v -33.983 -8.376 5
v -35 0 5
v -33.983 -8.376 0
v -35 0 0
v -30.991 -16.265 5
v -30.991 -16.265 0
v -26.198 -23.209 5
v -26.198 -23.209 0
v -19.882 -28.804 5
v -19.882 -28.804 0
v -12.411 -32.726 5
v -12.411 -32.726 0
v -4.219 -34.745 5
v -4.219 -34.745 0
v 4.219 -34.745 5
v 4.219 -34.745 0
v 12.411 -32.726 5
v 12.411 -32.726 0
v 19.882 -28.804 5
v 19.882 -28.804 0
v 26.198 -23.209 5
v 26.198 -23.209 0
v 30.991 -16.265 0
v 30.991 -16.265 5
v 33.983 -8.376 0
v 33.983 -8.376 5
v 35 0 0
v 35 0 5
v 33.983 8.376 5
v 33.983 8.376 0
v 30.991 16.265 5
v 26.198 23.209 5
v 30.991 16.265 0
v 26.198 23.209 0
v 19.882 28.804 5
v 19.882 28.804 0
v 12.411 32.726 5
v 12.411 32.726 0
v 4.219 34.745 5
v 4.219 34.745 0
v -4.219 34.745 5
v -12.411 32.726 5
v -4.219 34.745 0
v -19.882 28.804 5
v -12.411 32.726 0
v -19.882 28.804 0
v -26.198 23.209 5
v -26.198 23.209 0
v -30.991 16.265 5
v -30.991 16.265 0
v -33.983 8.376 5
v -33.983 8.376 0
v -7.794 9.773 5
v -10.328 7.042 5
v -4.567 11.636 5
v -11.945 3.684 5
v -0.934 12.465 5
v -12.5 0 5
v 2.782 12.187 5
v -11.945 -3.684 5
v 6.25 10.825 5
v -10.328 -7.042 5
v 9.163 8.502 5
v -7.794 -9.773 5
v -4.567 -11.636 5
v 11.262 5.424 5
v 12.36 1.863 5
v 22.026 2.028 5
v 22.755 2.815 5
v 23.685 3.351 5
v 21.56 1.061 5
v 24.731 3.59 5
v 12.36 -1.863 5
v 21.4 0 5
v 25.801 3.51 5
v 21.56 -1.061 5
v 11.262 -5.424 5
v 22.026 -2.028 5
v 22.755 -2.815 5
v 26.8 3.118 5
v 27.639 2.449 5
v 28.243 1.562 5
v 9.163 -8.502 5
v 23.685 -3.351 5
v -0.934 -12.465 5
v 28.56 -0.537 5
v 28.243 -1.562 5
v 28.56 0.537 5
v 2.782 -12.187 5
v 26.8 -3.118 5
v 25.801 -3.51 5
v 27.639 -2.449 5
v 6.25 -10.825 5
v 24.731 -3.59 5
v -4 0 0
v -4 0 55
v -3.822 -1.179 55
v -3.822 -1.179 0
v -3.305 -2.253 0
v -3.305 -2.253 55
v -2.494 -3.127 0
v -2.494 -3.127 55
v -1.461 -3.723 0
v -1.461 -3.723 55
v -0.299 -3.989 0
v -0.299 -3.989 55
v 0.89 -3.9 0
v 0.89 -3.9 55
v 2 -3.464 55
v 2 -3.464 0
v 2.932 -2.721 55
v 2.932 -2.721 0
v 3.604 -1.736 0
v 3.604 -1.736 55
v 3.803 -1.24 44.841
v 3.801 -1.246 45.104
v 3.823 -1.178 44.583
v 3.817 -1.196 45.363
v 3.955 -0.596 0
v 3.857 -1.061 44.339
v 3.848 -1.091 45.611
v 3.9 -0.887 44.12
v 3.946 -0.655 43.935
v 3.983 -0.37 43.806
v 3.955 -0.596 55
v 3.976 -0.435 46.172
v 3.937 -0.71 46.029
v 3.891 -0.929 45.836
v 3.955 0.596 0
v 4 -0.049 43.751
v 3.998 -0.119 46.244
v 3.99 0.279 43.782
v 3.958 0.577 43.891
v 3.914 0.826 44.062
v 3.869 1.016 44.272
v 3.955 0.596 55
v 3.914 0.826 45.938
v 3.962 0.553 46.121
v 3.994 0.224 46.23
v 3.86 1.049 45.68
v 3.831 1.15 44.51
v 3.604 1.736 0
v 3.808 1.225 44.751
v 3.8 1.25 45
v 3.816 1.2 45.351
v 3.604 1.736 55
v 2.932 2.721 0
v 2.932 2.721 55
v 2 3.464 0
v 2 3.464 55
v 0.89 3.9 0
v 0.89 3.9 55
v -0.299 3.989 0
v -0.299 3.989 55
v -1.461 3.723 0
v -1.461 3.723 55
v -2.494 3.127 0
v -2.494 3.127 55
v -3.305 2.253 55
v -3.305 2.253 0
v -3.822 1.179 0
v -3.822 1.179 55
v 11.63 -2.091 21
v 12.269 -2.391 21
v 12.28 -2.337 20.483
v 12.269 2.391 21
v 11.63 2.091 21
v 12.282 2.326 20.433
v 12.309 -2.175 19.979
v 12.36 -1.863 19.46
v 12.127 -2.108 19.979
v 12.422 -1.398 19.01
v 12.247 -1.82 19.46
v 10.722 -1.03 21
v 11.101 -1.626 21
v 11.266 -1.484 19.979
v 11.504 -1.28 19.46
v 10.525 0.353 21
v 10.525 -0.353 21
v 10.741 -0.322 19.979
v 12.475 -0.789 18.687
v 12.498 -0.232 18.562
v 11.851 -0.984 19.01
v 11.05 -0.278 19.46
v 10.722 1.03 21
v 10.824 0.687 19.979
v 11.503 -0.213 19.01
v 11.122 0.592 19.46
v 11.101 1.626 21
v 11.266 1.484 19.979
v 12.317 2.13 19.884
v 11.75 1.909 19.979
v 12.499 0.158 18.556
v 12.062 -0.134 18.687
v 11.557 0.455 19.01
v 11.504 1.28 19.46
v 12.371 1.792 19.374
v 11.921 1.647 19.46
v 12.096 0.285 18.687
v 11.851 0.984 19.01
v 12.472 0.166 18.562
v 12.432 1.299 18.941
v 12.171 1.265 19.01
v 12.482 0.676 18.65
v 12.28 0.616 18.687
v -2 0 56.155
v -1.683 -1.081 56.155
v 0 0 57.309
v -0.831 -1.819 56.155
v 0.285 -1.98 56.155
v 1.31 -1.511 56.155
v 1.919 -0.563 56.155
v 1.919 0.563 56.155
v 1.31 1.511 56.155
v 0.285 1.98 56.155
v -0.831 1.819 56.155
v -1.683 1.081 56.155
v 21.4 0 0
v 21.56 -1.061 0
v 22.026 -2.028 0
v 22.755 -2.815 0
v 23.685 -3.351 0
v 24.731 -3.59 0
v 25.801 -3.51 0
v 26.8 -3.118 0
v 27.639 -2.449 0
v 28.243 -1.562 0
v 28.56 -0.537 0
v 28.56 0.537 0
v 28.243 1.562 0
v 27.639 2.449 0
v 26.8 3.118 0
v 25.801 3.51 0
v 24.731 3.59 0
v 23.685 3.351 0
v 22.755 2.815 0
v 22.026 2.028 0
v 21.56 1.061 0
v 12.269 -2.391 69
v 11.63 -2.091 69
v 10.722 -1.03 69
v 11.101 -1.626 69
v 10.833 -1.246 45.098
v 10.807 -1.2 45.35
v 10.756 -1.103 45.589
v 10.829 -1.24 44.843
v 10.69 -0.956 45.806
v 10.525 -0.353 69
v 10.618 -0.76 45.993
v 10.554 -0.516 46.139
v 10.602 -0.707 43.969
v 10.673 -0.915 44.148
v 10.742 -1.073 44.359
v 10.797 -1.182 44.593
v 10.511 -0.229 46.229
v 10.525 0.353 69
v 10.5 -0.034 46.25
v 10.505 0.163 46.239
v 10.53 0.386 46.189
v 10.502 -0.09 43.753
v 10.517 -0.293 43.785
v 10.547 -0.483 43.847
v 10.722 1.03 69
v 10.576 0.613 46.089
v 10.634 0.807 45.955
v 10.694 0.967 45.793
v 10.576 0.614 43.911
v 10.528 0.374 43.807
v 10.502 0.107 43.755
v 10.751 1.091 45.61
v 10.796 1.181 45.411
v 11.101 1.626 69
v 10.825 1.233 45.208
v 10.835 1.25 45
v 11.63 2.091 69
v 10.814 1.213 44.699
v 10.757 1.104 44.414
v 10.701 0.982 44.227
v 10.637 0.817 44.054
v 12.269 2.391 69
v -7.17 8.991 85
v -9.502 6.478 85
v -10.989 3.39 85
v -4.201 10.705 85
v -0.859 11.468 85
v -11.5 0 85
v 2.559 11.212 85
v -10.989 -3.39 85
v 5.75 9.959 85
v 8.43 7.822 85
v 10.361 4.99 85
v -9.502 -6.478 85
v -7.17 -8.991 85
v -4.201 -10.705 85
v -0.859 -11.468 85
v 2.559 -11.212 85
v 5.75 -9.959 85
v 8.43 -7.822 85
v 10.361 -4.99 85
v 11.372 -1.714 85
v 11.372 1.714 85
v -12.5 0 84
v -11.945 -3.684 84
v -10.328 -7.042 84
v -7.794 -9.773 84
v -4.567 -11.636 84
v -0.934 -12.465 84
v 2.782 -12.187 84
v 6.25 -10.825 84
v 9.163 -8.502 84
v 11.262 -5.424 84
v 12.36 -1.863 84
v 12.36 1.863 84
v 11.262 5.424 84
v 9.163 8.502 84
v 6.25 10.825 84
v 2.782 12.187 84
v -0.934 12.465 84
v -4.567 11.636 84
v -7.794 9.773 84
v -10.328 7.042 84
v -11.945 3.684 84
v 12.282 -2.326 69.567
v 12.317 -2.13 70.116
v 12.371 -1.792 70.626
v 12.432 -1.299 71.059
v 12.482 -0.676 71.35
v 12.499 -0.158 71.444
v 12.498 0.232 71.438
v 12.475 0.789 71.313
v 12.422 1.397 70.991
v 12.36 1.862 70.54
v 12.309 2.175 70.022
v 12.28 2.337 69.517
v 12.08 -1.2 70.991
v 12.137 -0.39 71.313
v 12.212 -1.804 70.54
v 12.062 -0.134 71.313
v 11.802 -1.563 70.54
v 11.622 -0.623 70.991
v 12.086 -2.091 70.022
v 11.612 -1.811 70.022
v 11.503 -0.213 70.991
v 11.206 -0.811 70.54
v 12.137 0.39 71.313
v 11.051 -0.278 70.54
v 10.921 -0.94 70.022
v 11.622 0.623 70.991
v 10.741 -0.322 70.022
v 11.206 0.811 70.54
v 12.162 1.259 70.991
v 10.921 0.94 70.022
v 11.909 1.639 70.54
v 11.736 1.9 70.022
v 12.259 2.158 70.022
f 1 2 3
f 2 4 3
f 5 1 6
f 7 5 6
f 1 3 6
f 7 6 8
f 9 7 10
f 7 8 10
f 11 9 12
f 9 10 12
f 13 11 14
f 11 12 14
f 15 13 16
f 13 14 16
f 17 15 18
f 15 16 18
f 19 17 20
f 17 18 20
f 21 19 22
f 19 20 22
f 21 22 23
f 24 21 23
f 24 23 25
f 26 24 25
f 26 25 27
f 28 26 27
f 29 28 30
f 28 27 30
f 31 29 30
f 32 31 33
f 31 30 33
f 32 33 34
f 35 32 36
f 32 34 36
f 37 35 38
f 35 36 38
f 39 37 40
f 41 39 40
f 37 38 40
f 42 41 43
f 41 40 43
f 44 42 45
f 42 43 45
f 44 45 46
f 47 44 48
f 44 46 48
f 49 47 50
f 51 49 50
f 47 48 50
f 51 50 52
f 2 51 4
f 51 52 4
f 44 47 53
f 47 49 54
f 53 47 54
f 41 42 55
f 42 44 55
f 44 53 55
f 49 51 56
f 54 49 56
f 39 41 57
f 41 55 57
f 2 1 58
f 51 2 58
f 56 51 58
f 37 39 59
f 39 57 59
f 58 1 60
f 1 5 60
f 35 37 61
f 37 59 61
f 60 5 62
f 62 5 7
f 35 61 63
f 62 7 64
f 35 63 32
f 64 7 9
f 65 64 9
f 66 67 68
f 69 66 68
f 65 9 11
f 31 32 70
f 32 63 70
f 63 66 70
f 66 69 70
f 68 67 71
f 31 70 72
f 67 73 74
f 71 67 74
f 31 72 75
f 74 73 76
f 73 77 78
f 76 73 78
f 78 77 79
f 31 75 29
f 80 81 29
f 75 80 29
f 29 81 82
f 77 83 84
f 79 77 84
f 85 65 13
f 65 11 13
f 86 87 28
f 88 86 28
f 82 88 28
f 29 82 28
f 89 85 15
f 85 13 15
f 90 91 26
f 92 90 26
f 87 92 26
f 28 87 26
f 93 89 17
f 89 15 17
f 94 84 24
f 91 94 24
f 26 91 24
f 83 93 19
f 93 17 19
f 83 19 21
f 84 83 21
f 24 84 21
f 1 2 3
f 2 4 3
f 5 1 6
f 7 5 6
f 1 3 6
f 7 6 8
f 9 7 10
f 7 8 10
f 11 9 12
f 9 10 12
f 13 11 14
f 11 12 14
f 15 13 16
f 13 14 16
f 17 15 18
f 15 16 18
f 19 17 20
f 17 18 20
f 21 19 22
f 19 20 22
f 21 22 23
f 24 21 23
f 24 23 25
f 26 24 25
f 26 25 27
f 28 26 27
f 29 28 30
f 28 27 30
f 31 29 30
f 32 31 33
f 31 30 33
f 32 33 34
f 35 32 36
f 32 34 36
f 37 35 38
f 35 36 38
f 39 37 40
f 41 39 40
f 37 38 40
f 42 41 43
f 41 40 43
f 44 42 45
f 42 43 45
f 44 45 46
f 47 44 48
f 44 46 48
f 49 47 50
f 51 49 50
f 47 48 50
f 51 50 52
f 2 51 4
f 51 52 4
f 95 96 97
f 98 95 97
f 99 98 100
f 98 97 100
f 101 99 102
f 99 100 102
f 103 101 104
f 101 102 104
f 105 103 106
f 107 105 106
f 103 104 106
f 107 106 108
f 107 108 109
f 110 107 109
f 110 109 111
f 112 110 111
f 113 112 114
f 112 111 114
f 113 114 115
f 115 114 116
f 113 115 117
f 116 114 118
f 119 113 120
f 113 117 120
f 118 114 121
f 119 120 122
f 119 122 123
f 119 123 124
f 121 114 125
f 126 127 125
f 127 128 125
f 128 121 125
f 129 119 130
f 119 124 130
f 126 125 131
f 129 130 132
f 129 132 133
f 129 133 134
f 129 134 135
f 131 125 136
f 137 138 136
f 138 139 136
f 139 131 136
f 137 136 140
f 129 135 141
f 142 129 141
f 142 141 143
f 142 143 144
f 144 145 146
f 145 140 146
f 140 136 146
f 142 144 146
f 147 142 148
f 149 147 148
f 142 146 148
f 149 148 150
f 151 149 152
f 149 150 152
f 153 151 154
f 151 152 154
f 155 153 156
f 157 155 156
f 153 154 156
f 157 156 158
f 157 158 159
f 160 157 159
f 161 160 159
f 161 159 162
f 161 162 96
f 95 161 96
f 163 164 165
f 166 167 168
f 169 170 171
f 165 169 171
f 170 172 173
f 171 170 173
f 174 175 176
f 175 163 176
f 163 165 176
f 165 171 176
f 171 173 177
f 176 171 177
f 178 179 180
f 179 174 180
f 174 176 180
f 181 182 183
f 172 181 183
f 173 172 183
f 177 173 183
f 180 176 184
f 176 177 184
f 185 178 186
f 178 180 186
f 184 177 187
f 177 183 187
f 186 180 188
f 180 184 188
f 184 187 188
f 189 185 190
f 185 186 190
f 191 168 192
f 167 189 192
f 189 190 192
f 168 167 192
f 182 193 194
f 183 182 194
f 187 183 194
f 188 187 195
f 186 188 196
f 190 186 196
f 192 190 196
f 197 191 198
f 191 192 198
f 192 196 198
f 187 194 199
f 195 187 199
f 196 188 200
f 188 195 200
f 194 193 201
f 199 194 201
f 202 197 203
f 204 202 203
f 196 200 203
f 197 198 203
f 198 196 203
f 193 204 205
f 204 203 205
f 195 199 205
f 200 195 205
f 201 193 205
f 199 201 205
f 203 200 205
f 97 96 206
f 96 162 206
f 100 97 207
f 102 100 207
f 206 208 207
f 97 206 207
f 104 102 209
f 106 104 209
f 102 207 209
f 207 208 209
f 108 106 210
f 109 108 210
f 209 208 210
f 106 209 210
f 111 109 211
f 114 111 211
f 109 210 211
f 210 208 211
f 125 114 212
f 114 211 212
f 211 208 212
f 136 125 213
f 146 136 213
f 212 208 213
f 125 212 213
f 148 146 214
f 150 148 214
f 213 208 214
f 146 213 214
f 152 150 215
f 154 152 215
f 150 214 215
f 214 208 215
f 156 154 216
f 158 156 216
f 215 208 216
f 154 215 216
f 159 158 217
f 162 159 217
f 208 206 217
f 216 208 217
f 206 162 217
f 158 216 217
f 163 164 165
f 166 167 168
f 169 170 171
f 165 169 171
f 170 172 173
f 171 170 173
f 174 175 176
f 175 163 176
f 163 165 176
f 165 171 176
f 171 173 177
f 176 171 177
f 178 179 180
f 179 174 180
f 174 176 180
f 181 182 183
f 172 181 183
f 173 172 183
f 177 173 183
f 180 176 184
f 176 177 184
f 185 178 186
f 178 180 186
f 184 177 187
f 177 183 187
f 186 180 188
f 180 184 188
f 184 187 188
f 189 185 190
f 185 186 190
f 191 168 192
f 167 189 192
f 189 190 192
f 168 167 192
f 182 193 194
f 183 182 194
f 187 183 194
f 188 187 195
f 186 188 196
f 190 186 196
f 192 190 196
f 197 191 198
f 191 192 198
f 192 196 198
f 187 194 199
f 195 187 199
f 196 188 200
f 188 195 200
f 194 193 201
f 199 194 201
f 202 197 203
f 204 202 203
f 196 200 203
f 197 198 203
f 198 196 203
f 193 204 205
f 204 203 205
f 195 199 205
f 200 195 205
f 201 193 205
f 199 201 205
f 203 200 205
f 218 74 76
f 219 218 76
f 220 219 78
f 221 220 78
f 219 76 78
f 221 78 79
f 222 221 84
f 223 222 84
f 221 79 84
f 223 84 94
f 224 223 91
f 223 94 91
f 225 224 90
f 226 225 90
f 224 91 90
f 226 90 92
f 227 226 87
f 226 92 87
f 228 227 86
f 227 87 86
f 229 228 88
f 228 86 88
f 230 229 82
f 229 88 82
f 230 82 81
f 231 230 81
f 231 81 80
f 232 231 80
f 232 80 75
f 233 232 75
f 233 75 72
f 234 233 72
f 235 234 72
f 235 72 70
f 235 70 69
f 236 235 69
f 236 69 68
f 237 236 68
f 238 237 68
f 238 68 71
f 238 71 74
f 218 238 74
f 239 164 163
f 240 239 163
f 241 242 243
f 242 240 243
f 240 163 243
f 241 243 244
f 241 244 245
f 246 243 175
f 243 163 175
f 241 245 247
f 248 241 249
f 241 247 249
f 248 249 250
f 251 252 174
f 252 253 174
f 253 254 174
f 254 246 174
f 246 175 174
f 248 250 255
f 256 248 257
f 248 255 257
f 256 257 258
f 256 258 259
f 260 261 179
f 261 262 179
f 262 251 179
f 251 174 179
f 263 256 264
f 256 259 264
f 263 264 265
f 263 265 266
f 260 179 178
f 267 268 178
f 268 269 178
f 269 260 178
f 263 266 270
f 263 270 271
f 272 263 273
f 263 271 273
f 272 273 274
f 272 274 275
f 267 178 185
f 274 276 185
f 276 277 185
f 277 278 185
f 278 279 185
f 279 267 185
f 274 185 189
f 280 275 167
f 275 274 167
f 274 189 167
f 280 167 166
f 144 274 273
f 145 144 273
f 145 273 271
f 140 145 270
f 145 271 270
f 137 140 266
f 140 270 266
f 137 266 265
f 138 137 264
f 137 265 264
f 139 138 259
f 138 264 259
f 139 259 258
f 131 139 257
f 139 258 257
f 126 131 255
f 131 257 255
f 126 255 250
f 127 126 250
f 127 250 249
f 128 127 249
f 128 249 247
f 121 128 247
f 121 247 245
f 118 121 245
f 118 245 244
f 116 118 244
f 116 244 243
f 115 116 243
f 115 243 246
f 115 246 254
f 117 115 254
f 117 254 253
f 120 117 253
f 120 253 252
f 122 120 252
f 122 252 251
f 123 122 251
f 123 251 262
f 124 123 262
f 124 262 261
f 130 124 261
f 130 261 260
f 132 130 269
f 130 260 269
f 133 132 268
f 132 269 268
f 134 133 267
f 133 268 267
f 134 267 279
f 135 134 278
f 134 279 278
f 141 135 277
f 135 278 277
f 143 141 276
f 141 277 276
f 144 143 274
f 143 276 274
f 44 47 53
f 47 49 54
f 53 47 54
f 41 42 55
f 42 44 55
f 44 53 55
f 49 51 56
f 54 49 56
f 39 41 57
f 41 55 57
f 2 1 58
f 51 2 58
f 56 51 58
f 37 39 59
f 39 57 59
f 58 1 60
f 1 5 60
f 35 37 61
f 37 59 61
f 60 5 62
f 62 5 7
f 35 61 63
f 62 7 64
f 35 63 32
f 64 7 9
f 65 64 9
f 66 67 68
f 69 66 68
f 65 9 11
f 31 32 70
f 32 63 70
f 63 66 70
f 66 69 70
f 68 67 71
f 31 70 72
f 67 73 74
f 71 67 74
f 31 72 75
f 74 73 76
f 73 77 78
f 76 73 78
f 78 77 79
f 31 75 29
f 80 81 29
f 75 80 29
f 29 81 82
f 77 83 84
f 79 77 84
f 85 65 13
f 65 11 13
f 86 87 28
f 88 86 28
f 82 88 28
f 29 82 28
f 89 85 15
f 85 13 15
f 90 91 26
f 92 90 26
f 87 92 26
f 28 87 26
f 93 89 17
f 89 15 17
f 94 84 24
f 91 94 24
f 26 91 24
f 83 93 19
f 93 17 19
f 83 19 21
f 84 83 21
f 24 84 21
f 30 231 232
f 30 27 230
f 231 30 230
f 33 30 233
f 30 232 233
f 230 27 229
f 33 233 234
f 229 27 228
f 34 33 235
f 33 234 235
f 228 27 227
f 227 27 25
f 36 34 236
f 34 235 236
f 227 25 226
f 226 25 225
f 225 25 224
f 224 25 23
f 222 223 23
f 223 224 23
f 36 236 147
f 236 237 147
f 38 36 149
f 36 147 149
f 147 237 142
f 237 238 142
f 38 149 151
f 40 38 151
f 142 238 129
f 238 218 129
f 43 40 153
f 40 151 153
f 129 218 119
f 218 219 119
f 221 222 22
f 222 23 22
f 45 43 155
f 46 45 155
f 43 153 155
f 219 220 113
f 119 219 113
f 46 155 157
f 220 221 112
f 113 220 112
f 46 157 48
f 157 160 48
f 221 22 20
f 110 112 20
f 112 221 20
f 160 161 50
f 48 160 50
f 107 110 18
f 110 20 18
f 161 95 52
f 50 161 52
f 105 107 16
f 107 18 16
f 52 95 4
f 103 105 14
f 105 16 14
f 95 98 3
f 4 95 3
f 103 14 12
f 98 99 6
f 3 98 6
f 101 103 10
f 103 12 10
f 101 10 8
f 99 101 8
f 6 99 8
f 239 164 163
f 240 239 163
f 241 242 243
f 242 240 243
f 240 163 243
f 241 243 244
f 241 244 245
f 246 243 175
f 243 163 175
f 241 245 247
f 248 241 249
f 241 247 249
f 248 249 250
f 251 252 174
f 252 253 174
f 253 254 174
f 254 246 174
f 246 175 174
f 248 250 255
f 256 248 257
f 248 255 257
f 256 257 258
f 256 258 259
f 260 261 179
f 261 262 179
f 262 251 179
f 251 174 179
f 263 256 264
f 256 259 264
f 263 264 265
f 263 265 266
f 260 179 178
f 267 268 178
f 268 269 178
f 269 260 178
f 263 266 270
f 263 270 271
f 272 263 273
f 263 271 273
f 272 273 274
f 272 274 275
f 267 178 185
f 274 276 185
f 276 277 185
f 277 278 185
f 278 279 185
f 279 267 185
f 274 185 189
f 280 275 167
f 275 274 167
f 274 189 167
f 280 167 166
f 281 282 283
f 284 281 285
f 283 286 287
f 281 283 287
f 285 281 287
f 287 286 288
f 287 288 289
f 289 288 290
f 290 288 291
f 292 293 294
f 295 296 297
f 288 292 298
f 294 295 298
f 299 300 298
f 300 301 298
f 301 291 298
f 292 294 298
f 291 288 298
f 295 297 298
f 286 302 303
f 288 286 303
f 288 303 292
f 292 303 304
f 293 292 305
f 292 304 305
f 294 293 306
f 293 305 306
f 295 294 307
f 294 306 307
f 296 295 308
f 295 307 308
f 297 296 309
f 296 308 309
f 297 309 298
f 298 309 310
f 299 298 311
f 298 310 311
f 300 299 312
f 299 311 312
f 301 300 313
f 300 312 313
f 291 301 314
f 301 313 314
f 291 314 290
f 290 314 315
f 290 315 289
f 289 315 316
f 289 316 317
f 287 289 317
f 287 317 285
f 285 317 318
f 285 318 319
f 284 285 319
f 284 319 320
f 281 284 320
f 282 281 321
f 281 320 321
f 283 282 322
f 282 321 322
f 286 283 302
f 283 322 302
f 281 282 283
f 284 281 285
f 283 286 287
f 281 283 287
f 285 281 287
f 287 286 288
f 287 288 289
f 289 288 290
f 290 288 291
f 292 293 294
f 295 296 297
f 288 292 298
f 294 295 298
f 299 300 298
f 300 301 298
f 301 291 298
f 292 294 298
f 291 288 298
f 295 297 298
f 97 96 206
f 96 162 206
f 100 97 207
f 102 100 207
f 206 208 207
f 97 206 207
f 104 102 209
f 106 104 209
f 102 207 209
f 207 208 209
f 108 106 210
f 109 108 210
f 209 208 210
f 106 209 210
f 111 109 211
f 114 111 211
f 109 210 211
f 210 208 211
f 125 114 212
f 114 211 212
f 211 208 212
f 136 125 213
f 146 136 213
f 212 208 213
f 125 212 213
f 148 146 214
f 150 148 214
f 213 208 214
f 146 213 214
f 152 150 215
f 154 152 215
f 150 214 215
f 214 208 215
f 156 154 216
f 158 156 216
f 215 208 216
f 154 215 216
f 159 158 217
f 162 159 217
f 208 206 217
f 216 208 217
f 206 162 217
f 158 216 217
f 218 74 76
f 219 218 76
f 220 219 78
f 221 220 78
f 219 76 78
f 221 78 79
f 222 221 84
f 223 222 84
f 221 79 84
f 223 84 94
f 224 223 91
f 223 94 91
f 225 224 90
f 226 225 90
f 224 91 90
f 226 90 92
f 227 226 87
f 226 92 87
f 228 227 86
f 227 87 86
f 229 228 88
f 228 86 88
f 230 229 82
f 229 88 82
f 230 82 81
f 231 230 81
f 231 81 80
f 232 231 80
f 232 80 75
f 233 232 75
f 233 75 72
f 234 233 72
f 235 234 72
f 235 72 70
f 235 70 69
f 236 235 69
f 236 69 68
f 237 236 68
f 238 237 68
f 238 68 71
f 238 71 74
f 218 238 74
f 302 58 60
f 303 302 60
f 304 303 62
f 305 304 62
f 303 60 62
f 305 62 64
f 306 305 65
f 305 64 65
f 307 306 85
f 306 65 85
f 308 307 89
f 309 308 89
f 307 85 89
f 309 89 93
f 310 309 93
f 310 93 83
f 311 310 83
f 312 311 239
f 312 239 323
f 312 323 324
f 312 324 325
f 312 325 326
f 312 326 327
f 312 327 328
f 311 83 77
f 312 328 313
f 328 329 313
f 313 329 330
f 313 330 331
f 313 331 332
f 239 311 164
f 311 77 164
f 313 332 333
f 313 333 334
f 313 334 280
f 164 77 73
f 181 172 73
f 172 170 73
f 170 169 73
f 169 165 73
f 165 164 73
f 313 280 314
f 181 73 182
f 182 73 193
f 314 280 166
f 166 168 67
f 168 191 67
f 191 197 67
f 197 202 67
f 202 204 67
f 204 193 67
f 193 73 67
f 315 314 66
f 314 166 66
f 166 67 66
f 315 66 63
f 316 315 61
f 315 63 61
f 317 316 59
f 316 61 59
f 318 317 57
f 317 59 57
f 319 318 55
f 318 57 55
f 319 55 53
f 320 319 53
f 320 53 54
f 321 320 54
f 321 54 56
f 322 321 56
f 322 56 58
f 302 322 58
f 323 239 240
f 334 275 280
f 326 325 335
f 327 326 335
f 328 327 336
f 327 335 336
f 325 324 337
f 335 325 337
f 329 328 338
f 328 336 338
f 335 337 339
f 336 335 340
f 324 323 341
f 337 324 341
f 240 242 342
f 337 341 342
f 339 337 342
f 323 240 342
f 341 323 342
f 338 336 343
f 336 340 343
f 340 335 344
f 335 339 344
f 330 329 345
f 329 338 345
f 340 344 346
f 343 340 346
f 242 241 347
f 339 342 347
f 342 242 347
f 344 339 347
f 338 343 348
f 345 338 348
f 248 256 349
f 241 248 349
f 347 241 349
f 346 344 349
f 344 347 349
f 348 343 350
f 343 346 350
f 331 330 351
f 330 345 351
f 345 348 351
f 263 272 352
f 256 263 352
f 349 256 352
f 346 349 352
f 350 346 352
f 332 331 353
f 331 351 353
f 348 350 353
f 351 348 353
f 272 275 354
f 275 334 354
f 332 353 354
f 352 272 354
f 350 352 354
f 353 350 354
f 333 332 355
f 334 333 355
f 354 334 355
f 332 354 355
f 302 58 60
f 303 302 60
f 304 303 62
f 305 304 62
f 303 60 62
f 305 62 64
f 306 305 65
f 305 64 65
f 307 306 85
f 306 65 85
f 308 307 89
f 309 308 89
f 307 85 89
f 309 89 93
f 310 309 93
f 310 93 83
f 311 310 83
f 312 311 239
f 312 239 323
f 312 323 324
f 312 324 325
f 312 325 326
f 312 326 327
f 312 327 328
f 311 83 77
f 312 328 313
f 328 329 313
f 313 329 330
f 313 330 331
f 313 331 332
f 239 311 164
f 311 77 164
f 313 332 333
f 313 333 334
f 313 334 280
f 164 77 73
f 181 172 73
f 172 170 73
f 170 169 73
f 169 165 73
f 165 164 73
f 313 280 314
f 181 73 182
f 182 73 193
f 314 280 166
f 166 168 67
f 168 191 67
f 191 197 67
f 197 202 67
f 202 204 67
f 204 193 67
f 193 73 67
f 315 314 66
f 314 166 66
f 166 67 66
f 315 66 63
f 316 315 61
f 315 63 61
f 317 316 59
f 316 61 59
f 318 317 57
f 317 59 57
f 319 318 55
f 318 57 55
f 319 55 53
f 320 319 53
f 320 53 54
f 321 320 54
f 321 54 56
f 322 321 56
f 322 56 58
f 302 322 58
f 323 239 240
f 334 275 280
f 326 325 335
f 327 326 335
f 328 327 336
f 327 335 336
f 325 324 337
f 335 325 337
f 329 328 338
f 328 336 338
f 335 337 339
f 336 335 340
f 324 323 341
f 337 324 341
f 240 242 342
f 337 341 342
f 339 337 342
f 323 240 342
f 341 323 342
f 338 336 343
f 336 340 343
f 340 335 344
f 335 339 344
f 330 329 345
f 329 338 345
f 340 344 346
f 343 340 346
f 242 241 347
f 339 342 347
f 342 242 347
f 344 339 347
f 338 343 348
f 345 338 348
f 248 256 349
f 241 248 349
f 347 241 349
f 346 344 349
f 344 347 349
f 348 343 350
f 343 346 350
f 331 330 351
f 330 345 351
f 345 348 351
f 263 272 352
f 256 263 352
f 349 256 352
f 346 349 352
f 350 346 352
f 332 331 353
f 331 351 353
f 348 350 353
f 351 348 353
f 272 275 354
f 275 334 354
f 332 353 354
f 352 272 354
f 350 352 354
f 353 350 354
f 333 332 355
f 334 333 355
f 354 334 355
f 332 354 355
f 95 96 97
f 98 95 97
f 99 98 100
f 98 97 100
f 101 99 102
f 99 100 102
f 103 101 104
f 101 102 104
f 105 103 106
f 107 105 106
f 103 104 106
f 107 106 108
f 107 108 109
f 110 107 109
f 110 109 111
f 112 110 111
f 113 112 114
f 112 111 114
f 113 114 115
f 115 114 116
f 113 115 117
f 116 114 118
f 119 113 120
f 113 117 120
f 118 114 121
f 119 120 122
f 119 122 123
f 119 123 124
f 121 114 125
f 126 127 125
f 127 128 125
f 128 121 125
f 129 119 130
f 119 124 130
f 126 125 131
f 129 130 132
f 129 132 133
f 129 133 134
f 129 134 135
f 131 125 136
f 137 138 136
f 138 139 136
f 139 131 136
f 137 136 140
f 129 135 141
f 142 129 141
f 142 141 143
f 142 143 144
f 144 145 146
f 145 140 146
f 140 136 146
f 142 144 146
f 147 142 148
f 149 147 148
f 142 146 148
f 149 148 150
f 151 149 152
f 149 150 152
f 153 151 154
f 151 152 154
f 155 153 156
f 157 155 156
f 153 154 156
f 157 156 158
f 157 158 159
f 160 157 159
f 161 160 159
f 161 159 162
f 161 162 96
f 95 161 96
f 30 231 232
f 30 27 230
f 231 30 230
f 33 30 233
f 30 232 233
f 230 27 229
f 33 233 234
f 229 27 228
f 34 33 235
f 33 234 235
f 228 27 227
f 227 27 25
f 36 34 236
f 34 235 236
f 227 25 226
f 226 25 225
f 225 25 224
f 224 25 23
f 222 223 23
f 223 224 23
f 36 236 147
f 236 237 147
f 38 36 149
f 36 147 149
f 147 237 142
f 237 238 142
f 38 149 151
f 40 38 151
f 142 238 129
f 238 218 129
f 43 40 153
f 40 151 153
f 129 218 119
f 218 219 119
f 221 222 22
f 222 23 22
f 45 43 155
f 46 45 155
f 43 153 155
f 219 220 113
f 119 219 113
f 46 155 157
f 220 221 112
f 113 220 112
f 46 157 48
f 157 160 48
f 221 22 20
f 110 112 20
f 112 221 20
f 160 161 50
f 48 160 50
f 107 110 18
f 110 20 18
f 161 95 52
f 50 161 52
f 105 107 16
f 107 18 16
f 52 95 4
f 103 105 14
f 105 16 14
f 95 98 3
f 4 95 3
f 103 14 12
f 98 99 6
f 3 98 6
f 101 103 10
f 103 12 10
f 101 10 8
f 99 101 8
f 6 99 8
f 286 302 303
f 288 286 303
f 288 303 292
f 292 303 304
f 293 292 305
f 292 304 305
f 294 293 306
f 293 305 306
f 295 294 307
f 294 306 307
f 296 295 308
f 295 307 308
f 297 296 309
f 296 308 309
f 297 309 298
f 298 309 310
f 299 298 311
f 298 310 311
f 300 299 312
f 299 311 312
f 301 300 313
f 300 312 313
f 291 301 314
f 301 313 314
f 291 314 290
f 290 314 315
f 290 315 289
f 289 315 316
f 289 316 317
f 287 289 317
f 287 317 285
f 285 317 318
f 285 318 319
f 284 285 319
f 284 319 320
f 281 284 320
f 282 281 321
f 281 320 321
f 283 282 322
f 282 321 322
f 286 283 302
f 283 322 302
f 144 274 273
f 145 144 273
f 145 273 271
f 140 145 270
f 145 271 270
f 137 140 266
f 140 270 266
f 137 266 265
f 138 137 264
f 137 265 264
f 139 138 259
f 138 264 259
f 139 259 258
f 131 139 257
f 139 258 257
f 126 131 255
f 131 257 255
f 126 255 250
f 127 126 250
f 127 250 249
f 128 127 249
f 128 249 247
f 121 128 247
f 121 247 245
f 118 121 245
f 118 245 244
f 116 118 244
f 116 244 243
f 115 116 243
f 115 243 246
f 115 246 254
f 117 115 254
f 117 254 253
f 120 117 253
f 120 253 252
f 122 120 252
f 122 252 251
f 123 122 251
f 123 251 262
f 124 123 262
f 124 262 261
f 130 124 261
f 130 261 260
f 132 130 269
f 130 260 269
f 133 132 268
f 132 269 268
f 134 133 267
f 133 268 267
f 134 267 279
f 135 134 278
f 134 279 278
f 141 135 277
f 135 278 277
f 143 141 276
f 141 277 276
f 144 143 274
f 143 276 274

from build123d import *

# Parameters (mm, degrees)
SKETCH002_R     = 1.25
POCKET_DEPTH    = 13
SKETCH003_R     = 3.6
POCKET001_DEPTH = 5.001
CHAMFER_SIZE    = 1
SKETCH006_R     = 1.25
POCKET002_DEPTH = 13
SKETCH007_R     = 3.6
POCKET003_DEPTH = 5.001
CHAMFER001_SIZE = 1


with BuildPart() as body:
    # Sketch → Revolution (revolve)
    with BuildSketch(Plane.XZ):
        Polygon((0, 85), (-12.5, 85), (-12.5, 5), (-35, 5), (-35, 0), (-4, 0), (-4, 55), (0, 57.309401), align=None)
    revolve(axis=Axis((0, 0, 0), (0, 0, 1)))

    # Sketch001 (on DatumPlane) → Groove (revolve, cut)
    with BuildSketch(Plane.XZ):
        with BuildLine():
            Line((13, 71.5), (13, 18.5))
            ThreePointArc((10.5, 21), (11.232233, 19.232233), (13, 18.5))
            Line((10.5, 69), (10.5, 21))
            ThreePointArc((13, 71.5), (11.232233, 70.767767), (10.5, 69))
        make_face()
    revolve(axis=Axis((13, 0, 82.544502), (0, 0, -1)), mode=Mode.SUBTRACT)

    # Sketch002 (on DatumPlane) → Pocket (cut)
    with BuildSketch(Plane.YZ.offset(13)):
        with Locations((0, 45)):
            Circle(SKETCH002_R)
    extrude(amount=-POCKET_DEPTH, mode=Mode.SUBTRACT)

    # Sketch003 (on Face3 of Pocket) → Pocket001 (cut, through all)
    with BuildSketch(Plane(origin=(0, 0, 5), x_dir=(-1, 0, 0), z_dir=(0, 0, 1))):
        with Locations((-25, 0)):
            Circle(SKETCH003_R)
    extrude(amount=-POCKET001_DEPTH, mode=Mode.SUBTRACT)

    # Chamfer
    chamfer_edges = [body.edges().sort_by_distance(p)[0] for p in [
        (12.5, 0, 85),
    ]]
    chamfer(chamfer_edges, length=CHAMFER_SIZE)


with BuildPart() as chamfer001:
    # Sketch004 → Revolution001 (revolve)
    with BuildSketch(Plane.XZ):
        Polygon((0, 85), (-12.5, 85), (-12.5, 5), (-35, 5), (-35, 0), (-4, 0), (-4, 55), (0, 57.309401), align=None)
    revolve(axis=Axis((0, 0, 0), (0, 0, 1)))

    # Sketch005 (on DatumPlane) → Groove001 (revolve, cut)
    with BuildSketch(Plane.XZ):
        with BuildLine():
            Line((13, 71.5), (13, 18.5))
            ThreePointArc((10.5, 21), (11.232233, 19.232233), (13, 18.5))
            Line((10.5, 69), (10.5, 21))
            ThreePointArc((13, 71.5), (11.232233, 70.767767), (10.5, 69))
        make_face()
    revolve(axis=Axis((13, 0, 82.544502), (0, 0, -1)), mode=Mode.SUBTRACT)

    # Sketch006 (on DatumPlane) → Pocket002 (cut)
    with BuildSketch(Plane.YZ.offset(13)):
        with Locations((0, 45)):
            Circle(SKETCH006_R)
    extrude(amount=-POCKET002_DEPTH, mode=Mode.SUBTRACT)

    # Sketch007 (on Face3 of Pocket002) → Pocket003 (cut, through all)
    with BuildSketch(Plane(origin=(0, 0, 5), x_dir=(-1, 0, 0), z_dir=(0, 0, 1))):
        with Locations((-25, 0)):
            Circle(SKETCH007_R)
    extrude(amount=-POCKET003_DEPTH, mode=Mode.SUBTRACT)

    # Chamfer001
    chamfer001_edges = [chamfer001.edges().sort_by_distance(p)[0] for p in [
        (12.5, 0, 85),
    ]]
    chamfer(chamfer001_edges, length=CHAMFER001_SIZE)


solid = Compound([body.part, chamfer001.part])
